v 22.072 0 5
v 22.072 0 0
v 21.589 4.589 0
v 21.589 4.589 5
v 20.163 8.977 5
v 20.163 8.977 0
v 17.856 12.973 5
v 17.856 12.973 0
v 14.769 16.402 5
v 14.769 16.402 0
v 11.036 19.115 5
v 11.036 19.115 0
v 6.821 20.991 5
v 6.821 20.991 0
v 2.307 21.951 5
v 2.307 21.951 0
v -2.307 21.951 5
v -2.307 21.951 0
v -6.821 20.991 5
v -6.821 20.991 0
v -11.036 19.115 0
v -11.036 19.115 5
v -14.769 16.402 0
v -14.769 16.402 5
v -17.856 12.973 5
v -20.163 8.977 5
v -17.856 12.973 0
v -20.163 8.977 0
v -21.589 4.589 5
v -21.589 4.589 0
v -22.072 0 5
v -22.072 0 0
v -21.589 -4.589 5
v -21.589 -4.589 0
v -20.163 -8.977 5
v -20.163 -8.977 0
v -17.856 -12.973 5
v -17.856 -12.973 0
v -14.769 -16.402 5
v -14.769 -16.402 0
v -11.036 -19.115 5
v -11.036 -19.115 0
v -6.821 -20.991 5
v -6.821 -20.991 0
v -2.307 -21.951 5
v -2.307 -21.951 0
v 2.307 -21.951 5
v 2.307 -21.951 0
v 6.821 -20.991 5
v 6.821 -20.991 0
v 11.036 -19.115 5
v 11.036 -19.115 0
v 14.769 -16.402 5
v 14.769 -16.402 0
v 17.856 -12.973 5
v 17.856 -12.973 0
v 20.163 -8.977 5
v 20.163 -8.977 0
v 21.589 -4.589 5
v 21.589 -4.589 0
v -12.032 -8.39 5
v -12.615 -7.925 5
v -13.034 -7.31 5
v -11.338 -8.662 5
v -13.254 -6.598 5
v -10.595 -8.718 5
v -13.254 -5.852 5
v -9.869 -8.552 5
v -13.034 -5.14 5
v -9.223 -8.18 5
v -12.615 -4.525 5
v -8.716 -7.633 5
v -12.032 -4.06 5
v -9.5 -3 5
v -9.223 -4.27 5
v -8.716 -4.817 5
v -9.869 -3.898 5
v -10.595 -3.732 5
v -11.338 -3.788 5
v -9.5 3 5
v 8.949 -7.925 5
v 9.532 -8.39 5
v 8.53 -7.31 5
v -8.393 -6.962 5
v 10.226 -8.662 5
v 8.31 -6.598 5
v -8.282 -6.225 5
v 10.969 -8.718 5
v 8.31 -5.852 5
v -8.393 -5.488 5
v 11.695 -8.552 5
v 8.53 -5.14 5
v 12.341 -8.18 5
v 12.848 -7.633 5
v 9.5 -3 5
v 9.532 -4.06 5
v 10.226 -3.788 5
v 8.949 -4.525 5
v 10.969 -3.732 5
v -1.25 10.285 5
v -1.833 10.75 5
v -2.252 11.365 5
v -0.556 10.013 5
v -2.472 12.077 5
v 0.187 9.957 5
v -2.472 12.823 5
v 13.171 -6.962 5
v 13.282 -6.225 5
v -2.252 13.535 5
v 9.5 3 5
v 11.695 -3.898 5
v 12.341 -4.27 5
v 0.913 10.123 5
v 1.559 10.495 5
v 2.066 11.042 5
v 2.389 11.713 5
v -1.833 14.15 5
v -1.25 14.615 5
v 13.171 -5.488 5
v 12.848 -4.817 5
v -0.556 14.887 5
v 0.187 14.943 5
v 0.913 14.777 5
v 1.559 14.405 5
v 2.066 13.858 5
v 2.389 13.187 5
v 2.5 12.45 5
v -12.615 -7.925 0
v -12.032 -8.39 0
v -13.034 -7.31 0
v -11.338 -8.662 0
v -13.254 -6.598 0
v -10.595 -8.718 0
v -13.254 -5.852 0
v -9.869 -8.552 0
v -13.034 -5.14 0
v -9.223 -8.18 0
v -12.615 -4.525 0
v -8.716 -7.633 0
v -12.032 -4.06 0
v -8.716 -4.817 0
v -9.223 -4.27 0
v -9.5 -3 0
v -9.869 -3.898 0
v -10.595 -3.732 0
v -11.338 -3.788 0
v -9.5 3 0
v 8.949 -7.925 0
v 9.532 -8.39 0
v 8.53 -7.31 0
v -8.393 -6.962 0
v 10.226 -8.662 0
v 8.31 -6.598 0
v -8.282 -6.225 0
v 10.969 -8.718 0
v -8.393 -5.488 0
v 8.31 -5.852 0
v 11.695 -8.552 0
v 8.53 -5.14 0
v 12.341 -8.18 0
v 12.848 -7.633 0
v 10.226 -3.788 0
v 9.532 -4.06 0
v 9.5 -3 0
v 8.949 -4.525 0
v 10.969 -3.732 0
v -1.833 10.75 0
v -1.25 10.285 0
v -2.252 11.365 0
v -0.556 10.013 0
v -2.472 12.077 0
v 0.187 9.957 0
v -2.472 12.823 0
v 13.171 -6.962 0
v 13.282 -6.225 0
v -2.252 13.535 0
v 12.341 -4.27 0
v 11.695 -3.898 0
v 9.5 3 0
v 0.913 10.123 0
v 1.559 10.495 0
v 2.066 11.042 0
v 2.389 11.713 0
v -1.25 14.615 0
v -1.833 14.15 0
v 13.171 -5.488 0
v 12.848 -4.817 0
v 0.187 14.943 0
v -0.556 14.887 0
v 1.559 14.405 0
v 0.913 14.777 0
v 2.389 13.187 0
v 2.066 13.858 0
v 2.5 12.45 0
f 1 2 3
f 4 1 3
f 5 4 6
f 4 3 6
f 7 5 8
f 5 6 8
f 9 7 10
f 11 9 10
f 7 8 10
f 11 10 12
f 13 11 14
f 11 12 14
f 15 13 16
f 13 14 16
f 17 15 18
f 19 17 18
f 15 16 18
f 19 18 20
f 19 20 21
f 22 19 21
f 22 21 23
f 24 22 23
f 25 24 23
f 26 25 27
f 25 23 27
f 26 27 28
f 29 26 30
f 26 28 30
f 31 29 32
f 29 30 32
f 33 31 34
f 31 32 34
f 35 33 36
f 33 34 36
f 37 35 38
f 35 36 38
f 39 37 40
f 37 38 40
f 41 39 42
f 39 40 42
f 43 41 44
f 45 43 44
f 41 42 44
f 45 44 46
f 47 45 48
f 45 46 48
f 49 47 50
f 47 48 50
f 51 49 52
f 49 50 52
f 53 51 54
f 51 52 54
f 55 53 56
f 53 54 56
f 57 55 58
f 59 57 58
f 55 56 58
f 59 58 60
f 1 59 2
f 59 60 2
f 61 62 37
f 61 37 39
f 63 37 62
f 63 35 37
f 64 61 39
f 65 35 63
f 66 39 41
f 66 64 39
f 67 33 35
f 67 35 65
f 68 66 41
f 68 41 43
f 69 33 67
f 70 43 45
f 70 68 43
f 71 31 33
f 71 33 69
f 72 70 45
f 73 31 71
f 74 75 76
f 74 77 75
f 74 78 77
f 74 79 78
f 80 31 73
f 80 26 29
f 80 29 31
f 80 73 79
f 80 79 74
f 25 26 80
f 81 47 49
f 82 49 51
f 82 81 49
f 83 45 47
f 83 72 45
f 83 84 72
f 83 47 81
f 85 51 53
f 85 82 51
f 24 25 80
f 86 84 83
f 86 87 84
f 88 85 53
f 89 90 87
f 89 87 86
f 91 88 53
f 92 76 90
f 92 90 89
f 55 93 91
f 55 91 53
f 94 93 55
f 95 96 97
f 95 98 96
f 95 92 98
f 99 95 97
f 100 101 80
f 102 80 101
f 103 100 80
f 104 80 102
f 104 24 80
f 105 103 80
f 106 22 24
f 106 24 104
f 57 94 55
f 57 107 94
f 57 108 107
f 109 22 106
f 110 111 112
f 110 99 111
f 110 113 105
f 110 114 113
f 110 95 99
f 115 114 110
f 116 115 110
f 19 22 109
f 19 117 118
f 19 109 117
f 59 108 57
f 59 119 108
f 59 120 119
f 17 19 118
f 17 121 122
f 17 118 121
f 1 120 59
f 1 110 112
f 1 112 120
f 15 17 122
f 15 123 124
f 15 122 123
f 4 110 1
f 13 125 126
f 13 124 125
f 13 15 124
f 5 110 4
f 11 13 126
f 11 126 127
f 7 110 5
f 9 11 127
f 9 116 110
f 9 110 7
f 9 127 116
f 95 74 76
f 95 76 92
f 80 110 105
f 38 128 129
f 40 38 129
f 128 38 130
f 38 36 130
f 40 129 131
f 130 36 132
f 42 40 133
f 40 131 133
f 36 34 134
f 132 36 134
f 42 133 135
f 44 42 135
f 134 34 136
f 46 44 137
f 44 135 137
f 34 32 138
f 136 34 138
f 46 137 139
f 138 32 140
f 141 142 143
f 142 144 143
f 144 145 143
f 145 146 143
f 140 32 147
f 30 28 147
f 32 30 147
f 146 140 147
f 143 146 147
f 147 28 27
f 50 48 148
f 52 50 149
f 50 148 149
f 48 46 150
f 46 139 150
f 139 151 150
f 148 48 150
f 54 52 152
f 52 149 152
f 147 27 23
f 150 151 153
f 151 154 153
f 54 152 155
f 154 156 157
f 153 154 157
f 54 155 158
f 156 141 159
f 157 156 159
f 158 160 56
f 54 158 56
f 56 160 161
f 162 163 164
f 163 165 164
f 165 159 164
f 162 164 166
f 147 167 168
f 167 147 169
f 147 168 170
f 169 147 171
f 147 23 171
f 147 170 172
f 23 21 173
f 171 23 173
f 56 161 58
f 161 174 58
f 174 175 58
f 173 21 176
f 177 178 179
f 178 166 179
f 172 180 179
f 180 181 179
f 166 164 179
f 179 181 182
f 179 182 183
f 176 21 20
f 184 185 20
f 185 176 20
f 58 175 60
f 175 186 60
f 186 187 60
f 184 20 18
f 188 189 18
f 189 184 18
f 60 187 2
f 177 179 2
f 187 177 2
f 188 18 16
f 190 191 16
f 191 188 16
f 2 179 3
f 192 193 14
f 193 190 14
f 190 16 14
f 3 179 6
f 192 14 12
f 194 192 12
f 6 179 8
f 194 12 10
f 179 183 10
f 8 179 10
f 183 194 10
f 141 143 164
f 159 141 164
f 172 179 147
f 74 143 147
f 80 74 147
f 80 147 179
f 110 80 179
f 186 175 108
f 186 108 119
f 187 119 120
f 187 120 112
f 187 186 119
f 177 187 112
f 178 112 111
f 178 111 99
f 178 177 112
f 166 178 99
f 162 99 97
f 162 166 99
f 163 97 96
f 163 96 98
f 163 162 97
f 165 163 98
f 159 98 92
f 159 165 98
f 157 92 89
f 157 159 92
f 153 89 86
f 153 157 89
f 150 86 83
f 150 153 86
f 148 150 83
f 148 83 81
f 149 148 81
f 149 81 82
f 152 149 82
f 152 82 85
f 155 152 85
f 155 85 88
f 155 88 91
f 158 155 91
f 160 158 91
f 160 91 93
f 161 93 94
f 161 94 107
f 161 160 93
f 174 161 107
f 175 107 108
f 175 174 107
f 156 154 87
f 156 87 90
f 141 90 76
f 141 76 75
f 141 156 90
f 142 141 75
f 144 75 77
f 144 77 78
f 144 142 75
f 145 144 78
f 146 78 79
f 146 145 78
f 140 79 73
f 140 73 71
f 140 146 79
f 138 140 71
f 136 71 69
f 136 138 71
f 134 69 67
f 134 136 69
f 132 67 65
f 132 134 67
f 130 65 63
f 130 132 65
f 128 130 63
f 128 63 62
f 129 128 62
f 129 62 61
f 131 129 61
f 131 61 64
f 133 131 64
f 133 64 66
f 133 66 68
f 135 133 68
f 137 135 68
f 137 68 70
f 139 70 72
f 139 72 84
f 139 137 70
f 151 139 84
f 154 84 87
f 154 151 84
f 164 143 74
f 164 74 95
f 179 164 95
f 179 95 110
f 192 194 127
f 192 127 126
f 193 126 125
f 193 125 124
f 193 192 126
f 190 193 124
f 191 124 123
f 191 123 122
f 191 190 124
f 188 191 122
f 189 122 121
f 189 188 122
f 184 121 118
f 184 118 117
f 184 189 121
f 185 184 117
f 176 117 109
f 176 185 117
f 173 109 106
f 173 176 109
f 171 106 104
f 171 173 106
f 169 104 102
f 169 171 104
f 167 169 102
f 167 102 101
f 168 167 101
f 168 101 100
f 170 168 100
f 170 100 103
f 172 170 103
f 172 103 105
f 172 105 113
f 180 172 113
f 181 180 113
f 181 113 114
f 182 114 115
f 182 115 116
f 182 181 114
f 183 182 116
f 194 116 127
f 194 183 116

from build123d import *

# Parameters (mm, degrees)
SKETCH_1_R      = 22.071639064
SKETCH_1_R_2    = 2.5
SKETCH_1_W      = 19
SKETCH_1_H      = 6
EXTRUDE_1_DEPTH = 5


with BuildPart() as part:
    # 스케치1 → 보스-돌출1 (new body)
    with BuildSketch(Plane.XY):
        Circle(SKETCH_1_R)
        with Locations((0, 12.45)):
            Circle(SKETCH_1_R_2, mode=Mode.SUBTRACT)
        with Locations((10.782016277, -6.225)):
            Circle(SKETCH_1_R_2, mode=Mode.SUBTRACT)
        with Locations((-10.782016277, -6.225)):
            Circle(SKETCH_1_R_2, mode=Mode.SUBTRACT)
        Rectangle(SKETCH_1_W, SKETCH_1_H, mode=Mode.SUBTRACT)
    extrude(amount=EXTRUDE_1_DEPTH)


solid = part.part
